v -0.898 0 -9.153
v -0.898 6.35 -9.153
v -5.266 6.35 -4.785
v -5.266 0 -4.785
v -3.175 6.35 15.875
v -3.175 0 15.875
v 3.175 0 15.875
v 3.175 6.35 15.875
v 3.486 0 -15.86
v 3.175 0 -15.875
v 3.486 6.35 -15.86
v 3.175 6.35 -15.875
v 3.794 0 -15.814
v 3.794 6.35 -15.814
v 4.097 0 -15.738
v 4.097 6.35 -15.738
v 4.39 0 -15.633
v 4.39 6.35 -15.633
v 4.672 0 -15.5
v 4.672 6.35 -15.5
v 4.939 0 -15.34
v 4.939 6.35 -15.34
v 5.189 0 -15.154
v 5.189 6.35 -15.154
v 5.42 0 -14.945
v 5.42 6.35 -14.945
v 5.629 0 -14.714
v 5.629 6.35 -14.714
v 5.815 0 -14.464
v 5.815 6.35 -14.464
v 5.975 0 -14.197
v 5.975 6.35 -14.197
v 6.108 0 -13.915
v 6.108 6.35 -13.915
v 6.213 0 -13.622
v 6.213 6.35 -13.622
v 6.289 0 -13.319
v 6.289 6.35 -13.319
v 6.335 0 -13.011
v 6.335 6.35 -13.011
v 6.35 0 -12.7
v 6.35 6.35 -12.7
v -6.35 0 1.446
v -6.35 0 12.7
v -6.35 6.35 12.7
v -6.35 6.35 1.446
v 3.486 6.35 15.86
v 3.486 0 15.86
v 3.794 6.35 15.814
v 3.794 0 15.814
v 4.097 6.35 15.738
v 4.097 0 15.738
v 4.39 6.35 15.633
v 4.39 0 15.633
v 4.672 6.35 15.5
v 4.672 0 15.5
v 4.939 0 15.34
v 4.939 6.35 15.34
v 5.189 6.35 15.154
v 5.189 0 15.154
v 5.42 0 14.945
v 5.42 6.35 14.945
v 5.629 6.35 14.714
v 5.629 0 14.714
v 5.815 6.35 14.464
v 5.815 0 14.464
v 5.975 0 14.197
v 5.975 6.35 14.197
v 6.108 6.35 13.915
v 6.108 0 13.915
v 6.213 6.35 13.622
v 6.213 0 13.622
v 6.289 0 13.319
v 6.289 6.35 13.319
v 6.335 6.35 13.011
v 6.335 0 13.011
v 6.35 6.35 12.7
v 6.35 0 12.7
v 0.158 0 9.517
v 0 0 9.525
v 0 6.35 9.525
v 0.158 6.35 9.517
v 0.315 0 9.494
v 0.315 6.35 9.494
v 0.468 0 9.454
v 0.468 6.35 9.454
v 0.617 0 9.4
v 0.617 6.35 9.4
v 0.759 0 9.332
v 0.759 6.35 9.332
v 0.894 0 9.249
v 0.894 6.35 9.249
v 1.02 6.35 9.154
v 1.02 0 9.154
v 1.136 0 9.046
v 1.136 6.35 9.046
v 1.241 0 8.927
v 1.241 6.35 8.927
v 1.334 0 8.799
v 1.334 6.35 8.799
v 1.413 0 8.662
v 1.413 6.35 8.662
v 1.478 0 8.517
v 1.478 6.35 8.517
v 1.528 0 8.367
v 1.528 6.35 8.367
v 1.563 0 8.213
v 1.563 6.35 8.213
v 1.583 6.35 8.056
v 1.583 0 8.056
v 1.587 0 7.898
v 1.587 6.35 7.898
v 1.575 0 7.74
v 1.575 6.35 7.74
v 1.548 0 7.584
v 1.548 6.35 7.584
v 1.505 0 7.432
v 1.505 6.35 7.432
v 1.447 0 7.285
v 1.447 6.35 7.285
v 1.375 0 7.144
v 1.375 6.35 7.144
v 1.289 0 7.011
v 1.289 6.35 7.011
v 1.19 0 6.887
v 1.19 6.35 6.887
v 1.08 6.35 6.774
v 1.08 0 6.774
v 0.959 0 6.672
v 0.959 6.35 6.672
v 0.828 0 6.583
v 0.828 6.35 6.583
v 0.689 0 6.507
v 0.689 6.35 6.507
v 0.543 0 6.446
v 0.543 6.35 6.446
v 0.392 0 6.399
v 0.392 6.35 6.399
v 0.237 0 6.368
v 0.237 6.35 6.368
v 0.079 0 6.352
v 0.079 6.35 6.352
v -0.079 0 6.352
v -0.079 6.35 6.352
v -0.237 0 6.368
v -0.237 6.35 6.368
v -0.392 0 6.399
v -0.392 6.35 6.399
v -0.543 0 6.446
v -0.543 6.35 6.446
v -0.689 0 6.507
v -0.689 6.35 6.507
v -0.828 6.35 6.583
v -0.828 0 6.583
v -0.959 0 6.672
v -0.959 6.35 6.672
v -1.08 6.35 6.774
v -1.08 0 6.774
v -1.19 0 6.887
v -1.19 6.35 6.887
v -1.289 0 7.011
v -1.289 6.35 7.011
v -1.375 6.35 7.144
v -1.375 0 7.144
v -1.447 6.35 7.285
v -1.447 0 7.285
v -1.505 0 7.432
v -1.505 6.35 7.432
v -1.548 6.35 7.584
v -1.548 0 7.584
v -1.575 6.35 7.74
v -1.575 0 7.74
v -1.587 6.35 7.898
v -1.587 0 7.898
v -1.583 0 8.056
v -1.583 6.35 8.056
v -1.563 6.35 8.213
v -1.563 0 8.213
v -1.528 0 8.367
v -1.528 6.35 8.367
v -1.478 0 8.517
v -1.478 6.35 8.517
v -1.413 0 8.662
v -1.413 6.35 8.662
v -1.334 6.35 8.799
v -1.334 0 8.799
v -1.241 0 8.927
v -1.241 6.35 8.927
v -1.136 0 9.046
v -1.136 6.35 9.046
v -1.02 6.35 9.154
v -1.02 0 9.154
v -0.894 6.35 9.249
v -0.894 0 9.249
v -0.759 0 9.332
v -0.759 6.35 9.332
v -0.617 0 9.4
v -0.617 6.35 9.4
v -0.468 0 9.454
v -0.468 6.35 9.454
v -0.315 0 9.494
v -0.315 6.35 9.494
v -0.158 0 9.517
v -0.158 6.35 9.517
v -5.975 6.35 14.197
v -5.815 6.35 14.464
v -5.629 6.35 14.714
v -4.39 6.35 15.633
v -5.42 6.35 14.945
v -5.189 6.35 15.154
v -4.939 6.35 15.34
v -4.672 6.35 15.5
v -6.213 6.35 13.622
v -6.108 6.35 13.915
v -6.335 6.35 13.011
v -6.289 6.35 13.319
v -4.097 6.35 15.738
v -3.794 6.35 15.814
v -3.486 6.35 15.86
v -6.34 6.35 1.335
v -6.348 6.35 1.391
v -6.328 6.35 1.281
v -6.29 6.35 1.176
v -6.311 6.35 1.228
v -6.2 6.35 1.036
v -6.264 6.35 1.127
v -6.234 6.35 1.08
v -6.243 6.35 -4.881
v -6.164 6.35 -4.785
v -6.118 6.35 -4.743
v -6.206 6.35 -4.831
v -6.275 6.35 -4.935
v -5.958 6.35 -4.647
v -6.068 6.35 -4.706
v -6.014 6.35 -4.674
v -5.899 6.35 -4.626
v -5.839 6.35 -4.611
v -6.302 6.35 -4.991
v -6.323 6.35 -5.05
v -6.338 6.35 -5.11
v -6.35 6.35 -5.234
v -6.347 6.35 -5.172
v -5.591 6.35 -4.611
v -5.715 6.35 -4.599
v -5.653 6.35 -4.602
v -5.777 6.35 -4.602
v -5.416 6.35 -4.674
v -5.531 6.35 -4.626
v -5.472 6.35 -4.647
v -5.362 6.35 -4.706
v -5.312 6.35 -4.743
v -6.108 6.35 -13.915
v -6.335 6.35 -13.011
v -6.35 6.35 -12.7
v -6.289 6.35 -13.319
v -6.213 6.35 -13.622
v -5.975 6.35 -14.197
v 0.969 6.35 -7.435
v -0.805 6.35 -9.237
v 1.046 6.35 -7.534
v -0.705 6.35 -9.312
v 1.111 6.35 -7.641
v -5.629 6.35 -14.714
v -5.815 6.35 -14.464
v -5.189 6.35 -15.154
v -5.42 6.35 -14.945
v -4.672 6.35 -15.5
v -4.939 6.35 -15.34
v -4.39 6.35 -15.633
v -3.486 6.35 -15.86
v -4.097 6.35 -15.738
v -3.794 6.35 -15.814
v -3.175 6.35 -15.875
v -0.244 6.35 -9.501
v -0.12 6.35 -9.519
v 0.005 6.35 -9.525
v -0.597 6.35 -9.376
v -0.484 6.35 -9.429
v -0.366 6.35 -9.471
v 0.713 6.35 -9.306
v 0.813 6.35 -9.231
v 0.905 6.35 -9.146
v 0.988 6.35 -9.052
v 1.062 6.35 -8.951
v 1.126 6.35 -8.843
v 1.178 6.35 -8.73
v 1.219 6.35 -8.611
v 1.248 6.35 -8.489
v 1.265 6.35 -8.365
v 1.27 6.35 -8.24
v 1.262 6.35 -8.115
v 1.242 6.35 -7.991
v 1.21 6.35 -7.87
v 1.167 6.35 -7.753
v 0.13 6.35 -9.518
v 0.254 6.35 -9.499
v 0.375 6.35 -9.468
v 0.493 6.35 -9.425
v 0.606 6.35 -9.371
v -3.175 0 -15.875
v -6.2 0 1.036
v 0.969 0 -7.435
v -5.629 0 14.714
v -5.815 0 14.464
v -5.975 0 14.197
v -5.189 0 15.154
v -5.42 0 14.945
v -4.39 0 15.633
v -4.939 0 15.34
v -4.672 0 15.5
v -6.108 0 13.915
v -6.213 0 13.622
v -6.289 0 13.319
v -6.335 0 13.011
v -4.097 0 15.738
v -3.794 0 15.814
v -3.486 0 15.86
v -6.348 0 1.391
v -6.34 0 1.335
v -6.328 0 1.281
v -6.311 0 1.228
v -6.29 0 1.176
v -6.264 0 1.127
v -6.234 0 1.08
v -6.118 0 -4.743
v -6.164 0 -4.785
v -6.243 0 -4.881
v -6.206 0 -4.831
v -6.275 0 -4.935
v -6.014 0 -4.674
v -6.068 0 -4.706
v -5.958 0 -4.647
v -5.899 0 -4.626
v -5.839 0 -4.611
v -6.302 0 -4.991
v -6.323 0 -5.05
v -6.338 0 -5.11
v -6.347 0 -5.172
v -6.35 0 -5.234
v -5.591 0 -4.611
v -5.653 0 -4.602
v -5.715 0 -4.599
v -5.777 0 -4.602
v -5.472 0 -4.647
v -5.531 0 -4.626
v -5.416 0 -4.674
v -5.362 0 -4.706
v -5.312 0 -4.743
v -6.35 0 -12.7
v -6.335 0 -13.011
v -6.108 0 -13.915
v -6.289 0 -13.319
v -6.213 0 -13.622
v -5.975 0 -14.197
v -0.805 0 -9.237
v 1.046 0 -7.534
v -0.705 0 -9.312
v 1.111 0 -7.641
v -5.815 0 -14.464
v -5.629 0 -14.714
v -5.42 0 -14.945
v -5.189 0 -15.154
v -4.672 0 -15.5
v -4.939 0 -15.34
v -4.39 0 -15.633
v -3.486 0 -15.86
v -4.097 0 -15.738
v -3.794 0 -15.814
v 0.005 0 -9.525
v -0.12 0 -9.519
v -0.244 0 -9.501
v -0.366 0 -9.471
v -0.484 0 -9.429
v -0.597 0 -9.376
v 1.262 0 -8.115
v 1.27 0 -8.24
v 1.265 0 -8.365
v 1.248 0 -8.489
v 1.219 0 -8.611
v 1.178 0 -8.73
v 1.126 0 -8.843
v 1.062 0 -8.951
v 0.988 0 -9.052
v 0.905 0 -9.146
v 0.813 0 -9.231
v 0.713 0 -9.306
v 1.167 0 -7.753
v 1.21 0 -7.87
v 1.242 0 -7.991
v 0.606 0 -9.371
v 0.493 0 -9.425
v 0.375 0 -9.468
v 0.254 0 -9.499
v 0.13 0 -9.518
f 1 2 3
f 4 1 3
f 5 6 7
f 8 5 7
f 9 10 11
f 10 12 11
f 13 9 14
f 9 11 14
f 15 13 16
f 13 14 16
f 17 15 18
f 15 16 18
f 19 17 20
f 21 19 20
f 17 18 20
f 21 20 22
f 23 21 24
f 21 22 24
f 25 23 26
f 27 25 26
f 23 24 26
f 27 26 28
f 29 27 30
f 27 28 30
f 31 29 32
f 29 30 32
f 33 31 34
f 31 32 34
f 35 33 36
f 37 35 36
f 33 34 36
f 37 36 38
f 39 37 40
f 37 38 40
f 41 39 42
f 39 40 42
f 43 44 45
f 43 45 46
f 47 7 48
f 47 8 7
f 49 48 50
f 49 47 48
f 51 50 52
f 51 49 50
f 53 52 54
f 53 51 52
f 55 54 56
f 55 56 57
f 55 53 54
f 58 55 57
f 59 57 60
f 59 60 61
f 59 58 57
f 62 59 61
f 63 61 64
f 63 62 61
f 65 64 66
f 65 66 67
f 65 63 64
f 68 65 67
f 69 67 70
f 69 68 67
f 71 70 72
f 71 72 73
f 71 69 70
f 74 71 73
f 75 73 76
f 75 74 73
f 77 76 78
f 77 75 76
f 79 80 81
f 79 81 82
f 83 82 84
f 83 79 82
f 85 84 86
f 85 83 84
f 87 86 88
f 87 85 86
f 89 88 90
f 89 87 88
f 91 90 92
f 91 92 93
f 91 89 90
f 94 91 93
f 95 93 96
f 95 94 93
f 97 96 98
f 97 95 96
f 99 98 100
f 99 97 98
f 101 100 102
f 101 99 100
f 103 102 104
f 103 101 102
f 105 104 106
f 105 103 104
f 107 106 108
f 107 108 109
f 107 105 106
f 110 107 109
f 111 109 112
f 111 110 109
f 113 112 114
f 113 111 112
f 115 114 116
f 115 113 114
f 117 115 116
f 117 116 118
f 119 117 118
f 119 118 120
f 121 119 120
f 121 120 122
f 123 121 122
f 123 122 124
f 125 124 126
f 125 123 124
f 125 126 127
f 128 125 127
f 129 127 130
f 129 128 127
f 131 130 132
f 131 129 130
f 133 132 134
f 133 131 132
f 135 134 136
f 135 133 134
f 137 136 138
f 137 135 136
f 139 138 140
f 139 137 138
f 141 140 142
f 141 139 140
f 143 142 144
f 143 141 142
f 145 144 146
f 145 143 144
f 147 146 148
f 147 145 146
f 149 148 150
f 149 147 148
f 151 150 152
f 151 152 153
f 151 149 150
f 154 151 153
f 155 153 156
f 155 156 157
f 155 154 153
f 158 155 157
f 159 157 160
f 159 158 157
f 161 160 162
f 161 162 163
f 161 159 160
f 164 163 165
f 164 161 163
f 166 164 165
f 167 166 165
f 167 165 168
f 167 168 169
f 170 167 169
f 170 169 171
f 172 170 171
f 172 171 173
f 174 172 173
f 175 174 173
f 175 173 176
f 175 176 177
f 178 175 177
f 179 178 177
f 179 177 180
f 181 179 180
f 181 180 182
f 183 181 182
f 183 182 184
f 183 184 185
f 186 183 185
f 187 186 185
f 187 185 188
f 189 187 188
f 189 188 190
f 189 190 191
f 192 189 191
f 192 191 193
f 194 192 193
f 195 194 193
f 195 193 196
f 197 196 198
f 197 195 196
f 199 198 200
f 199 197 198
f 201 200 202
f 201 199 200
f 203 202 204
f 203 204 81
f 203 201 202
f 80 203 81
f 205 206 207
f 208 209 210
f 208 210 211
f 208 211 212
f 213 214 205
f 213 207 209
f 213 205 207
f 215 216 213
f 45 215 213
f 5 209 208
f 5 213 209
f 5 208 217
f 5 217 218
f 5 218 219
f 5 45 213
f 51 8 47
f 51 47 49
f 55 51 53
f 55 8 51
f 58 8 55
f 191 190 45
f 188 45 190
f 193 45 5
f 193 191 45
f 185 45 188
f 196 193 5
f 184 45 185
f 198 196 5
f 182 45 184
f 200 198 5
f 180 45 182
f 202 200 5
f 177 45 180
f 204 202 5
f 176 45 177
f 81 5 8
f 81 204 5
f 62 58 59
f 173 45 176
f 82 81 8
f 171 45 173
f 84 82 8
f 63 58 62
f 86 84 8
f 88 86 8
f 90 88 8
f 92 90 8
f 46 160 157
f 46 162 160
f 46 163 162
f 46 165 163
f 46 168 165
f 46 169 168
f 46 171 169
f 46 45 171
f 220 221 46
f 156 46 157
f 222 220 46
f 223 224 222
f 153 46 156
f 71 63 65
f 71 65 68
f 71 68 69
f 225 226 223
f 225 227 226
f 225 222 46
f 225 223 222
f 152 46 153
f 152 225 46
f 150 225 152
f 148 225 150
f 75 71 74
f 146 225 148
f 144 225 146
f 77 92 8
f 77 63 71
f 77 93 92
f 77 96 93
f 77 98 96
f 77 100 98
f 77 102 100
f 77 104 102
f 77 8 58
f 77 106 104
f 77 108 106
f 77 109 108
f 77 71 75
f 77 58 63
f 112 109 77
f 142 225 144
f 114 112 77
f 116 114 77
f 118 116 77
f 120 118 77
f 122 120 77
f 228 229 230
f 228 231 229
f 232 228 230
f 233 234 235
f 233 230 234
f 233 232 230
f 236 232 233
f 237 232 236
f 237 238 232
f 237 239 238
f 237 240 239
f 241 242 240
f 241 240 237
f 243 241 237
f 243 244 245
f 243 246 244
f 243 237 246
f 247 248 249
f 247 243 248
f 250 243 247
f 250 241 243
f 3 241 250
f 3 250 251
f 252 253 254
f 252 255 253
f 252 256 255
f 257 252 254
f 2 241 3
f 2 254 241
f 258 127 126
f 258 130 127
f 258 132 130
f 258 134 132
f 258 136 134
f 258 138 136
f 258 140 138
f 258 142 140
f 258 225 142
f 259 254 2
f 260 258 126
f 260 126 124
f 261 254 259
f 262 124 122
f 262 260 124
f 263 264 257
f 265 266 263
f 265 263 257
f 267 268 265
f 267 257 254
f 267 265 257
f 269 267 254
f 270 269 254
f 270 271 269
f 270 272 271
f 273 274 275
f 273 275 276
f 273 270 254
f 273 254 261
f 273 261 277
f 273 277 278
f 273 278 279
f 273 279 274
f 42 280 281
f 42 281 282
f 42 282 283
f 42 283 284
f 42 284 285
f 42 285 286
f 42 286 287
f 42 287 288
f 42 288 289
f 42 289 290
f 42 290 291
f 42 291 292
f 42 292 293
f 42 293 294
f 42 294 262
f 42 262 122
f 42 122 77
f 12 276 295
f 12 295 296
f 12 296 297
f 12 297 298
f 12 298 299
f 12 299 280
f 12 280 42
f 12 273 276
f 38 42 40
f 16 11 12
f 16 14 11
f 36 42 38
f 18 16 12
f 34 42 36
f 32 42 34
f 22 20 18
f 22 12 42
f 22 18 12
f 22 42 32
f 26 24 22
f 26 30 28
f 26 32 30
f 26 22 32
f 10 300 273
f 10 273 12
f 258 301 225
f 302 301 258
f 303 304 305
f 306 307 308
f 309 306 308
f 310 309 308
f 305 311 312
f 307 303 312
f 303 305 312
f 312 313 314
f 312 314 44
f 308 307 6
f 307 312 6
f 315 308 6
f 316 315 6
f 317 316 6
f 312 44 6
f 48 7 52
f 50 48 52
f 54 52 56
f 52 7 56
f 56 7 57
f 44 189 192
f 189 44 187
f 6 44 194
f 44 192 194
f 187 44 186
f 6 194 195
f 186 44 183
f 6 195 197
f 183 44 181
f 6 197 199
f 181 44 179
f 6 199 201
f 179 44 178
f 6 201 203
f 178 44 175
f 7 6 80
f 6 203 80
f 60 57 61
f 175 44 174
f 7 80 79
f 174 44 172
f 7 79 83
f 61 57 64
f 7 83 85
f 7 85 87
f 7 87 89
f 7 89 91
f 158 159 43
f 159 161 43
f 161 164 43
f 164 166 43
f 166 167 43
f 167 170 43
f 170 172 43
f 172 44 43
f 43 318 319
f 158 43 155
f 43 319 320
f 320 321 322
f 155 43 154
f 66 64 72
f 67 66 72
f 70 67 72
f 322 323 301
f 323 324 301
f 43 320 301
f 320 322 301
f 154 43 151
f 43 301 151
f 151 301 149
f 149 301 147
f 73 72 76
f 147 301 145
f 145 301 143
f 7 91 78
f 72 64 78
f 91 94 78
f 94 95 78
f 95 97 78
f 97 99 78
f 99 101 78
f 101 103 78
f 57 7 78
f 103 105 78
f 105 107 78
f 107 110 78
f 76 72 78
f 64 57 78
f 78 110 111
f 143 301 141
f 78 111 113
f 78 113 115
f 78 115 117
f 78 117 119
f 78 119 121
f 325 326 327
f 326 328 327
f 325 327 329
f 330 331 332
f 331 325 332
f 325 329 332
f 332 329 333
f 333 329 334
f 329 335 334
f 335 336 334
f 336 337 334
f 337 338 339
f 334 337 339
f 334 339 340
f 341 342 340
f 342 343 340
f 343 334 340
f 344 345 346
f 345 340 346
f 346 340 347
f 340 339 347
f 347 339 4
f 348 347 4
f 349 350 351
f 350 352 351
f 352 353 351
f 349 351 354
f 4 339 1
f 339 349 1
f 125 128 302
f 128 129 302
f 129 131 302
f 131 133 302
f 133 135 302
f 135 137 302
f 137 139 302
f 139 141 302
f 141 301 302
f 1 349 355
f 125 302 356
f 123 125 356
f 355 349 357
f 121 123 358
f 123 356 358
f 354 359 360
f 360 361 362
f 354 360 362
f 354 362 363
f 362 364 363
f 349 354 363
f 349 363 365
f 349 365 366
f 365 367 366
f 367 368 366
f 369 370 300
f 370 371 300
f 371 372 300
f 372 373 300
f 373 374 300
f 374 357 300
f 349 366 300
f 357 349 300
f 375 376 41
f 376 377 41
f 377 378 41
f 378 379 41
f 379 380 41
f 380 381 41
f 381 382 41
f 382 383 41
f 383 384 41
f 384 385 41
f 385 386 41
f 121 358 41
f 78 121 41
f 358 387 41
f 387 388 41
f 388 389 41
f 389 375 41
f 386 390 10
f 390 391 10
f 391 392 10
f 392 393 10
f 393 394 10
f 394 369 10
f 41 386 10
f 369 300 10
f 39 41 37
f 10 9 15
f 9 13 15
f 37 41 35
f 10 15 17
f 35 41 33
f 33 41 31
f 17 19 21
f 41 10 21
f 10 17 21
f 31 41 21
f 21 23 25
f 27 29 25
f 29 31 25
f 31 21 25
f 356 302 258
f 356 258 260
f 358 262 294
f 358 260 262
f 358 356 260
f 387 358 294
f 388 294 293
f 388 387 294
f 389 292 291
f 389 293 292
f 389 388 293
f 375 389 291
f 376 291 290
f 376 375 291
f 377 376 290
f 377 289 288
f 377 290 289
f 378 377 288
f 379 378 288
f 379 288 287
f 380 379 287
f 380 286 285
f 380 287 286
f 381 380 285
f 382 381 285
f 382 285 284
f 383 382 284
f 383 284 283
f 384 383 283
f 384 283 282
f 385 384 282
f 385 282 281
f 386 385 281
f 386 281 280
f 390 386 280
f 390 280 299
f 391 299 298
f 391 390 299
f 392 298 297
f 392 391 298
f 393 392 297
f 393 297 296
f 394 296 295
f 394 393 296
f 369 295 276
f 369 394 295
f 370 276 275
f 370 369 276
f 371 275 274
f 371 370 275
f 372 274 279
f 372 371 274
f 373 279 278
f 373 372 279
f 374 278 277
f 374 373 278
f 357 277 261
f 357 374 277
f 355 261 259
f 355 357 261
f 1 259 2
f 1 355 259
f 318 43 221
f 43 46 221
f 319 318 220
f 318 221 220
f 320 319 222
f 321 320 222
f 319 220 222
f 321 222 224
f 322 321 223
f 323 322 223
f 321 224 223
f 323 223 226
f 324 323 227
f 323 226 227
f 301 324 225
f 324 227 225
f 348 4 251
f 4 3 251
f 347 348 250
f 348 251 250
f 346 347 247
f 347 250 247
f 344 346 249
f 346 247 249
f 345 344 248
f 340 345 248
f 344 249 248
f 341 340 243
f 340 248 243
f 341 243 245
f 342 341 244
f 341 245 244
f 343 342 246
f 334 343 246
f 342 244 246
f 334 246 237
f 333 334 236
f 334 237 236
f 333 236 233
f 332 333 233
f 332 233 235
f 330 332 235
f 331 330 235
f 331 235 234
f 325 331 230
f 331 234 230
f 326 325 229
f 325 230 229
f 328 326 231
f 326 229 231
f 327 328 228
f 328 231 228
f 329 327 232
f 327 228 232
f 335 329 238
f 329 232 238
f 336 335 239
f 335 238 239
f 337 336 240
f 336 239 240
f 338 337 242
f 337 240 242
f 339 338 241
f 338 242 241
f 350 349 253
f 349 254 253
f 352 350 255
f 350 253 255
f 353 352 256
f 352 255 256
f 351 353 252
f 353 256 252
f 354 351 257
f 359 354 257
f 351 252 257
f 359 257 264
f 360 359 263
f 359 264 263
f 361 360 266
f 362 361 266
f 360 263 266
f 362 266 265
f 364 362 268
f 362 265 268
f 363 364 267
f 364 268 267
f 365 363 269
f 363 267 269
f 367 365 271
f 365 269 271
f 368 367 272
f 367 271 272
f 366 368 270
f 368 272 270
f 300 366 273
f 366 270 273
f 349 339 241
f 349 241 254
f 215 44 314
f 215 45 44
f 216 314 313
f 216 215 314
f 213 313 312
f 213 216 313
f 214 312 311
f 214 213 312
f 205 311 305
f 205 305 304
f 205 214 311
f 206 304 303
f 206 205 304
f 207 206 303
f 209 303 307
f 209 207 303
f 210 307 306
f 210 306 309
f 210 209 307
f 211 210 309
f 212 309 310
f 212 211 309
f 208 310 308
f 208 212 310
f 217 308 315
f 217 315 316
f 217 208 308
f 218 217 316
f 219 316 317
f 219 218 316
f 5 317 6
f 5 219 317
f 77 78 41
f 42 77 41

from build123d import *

# Parameters (mm, degrees)
SKETCH1_W           = 12.7
SKETCH1_H           = 31.75
SKETCH1_R           = 1.5875
BOSS_EXTRUDE2_DEPTH = 6.35
CUT_EXTRUDE2_DEPTH  = 19.238986403
FILLET2_R           = 3.175
FILLET3_R           = 0.635


with BuildPart() as part:
    # Sketch1 → Boss-Extrude2 (new body)
    with BuildSketch(Plane(origin=(0, 0, 0), x_dir=(1, 0, 0), z_dir=(0, 1, 0))):
        Rectangle(SKETCH1_W, SKETCH1_H)
        with Locations((0, -7.9375)):
            Circle(SKETCH1_R, mode=Mode.SUBTRACT)
    extrude(amount=BOSS_EXTRUDE2_DEPTH)

    # Sketch1<5> → Cut-Extrude2 (cut, through all)
    with BuildSketch(Plane(origin=(0, 0, 0), x_dir=(1, 0, 0), z_dir=(0, 1, 0))):
        with BuildLine():
            Line((-6.35, 3.701051224), (-6.35, -1.213547665))
            Line((-6.35, -1.213547665), (0.969401523, 7.434536298))
            ThreePointArc((0.969401523, 7.434536298), (0.859985471, 9.189518587), (-0.898025612, 9.153025612))
            Line((-0.898025612, 9.153025612), (-6.35, 3.701051224))
        make_face()
    extrude(amount=CUT_EXTRUDE2_DEPTH, mode=Mode.SUBTRACT)

    # Fillet2
    fillet2_edges = [part.edges().sort_by_distance(p)[0] for p in [
        (-6.35, 3.175, -15.875),
        (6.35, 3.175, -15.875),
        (6.35, 3.175, 15.875),
        (-6.35, 3.175, 15.875),
    ]]
    fillet(fillet2_edges, radius=FILLET2_R)

    # Fillet3
    fillet3_edges = [part.edges().sort_by_distance(p)[0] for p in [
        (-6.35, 3.175, 1.213547665),
        (-6.35, 3.175, -3.701051224),
    ]]
    fillet(fillet3_edges, radius=FILLET3_R)


solid = part.part
